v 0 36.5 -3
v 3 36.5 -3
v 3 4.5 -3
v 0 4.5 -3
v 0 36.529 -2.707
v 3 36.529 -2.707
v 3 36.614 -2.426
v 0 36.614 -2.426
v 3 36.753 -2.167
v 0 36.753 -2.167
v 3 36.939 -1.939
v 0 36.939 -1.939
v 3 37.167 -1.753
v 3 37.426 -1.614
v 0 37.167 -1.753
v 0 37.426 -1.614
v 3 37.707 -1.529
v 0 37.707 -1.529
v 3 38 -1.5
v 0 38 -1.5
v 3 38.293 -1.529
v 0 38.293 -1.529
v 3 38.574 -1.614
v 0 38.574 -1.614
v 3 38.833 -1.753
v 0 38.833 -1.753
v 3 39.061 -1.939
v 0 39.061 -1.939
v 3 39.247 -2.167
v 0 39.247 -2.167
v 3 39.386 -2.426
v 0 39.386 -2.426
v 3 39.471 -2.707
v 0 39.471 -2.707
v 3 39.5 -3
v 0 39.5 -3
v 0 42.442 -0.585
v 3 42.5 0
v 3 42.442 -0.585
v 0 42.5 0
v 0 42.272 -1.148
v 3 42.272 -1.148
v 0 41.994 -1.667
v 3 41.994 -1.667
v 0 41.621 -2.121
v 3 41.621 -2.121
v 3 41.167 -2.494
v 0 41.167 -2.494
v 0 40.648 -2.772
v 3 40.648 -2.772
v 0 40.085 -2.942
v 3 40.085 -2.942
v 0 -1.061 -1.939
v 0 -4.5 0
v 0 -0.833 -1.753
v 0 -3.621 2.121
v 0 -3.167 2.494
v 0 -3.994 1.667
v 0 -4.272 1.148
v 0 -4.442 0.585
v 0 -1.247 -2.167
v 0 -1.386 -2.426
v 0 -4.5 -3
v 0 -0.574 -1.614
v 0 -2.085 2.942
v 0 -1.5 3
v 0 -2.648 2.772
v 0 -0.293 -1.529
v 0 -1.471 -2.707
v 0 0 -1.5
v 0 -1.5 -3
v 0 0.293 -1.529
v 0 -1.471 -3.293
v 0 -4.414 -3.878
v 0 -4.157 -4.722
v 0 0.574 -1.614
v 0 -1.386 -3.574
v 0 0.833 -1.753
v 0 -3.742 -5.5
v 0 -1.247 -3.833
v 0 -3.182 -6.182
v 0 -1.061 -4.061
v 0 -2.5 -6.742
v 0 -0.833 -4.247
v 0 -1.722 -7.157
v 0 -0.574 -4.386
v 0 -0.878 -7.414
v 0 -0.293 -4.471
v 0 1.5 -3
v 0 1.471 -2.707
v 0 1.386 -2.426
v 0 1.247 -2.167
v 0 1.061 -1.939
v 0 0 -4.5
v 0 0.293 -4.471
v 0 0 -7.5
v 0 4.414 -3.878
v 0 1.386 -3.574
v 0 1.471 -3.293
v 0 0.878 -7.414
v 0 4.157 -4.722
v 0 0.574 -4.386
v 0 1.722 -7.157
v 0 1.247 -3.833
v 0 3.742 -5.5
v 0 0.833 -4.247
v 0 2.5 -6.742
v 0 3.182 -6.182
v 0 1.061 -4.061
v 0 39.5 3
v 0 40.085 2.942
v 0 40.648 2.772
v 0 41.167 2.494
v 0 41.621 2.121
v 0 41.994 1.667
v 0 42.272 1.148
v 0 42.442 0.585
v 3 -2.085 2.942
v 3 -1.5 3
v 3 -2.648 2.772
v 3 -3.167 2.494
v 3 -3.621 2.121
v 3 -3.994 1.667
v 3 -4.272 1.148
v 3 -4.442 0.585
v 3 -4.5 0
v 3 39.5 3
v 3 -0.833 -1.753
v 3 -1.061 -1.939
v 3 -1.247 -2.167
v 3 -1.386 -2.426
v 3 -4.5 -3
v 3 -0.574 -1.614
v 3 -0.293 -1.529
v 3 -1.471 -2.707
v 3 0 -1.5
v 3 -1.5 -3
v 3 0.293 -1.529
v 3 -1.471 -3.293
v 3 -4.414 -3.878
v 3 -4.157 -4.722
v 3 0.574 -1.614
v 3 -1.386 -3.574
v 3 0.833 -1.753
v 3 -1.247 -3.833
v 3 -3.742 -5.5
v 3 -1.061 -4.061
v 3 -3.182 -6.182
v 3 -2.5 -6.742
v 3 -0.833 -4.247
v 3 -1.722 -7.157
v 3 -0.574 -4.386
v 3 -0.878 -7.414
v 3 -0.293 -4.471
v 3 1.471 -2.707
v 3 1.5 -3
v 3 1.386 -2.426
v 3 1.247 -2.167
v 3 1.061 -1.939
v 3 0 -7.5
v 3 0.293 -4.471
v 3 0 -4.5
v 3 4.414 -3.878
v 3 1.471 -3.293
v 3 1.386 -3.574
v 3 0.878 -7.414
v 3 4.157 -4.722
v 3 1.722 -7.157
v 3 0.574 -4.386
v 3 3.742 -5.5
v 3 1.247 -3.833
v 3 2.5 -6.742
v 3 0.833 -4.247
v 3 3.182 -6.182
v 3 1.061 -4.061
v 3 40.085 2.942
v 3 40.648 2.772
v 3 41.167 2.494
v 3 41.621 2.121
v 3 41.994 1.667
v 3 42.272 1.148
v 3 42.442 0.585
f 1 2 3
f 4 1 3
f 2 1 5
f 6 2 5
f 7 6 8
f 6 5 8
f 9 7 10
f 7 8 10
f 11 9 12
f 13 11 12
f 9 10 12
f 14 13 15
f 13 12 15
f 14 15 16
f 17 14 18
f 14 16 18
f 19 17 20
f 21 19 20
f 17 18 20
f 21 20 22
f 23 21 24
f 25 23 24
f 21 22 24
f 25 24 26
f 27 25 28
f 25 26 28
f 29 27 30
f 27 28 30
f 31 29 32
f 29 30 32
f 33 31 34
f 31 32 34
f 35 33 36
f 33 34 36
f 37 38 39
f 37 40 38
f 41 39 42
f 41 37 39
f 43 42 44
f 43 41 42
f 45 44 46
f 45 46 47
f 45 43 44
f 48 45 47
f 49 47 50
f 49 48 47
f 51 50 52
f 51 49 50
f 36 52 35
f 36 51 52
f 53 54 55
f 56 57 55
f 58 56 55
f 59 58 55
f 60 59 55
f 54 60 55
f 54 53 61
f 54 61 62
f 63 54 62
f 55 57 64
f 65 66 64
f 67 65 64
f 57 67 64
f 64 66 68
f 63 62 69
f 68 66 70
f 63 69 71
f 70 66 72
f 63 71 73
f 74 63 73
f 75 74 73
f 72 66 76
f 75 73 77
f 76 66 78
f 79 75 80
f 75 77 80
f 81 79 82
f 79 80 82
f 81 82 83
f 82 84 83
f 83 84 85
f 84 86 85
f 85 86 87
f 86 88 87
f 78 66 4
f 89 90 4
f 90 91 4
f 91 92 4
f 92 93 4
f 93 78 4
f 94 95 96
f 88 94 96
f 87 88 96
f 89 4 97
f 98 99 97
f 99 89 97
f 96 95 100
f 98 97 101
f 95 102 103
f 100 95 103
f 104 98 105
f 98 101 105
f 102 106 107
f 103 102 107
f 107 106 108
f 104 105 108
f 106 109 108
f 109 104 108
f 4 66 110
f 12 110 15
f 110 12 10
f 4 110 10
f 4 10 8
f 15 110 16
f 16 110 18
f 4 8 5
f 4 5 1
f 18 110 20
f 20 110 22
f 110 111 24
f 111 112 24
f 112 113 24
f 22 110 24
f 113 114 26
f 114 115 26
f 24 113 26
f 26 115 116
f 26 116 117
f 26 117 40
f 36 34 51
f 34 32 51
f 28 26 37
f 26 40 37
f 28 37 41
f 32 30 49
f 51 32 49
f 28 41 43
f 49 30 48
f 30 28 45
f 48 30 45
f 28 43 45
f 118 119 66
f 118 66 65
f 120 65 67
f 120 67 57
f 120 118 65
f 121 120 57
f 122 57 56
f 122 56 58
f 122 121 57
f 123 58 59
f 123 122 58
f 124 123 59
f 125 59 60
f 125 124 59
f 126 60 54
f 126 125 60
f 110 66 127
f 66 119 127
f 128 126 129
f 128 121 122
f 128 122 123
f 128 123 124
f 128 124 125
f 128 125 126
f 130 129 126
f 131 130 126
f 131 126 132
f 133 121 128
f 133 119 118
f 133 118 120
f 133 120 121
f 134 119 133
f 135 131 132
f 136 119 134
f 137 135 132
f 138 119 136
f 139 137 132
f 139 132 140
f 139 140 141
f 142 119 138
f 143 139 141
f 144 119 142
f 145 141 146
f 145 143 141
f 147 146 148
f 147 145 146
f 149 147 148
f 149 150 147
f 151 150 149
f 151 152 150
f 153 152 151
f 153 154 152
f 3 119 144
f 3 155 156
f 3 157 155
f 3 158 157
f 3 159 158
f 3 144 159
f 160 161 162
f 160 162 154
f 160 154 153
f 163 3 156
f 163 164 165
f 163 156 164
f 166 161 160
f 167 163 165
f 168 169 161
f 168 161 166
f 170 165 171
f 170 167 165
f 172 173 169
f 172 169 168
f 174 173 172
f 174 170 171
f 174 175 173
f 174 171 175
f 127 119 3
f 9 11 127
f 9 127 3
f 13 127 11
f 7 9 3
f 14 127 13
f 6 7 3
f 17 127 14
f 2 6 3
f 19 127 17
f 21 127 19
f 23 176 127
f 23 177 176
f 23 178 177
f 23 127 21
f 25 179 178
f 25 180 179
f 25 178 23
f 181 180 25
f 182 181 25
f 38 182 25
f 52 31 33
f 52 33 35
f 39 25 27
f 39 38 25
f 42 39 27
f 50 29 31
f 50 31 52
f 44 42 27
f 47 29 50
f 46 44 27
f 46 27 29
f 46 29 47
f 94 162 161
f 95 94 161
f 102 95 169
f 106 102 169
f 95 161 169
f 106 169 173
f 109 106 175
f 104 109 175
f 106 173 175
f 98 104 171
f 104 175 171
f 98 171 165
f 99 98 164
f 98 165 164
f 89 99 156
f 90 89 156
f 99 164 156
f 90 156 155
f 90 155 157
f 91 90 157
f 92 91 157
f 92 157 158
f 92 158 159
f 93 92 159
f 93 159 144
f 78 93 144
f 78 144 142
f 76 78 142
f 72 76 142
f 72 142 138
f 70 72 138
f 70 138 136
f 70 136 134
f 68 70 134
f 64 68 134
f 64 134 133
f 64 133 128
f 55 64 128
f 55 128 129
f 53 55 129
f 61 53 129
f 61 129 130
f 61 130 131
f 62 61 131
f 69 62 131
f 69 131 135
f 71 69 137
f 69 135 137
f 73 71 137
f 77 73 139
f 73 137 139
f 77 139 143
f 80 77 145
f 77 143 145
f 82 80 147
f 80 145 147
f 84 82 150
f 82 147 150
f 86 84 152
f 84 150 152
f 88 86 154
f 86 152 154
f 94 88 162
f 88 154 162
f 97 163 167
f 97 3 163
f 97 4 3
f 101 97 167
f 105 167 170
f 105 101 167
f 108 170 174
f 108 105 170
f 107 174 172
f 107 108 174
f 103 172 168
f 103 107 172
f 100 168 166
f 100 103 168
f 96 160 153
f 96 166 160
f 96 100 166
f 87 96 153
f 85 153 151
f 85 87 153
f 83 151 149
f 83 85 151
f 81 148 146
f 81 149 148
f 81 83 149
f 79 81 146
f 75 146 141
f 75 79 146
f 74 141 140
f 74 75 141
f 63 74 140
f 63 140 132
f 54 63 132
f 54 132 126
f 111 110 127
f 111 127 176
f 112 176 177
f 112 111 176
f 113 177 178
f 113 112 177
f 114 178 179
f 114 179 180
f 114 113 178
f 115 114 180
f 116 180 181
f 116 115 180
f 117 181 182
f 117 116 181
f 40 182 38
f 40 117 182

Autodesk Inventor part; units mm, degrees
ref_plane "YZ Plane" through (0, 0, 0) normal (1, 0, 0) x (0, 1, 0)
ref_plane "XZ Plane" through (0, 0, 0) normal (0, 1, 0) x (-1, 0, 0)
ref_plane "XY Plane" through (0, 0, 0) normal (0, 0, 1) x (1, 0, 0)
sketch "Sketch1" plane through (0, 0, 0) normal (1, 0, 0) x (0, 1, 0)
  line L0 (-4.5, 3) -> (4.5, 3)
  line L1 (4.5, 3) -> (4.5, -3)
  line L2 (4.5, -3) -> (-4.5, -3)
  line L3 (-4.5, -3) -> (-4.5, 3)
  line L4 (-4.5, 3) -> (4.5, -3) construction
  line L5 (4.5, 3) -> (-4.5, -3) construction
  circle A0 centre (0, -3) radius 4.5
  point P0 (0, 0)
  dimension "d0" = 9
  dimension "d1" = 6
  dimension "d2" = 9
extrude "Extrusion1" add sketch "Sketch1" along normal blind 3
sketch "Sketch2" plane through (3, 0, 0) normal (1, 0, 0) x (0, 0, -1)
  line L0 (3, 4.5) -> (-3, 4.5)
  line L1 (-3, 4.5) -> (-3, 42.5)
  line L2 (-3, 42.5) -> (3, 42.5)
  line L3 (3, 42.5) -> (3, 4.5)
  point P0 (0, 0)
  dimension "d5" = 6
  dimension "d6" = 38
extrude "Extrusion2" add sketch "Sketch2" against normal blind 3
sketch "Sketch3" plane through (3, 0, 0) normal (1, 0, 0) x (0, 0, -1)
  arc A0 (3, -4.5) -> (3, 4.5) centre (3, 0) ccw projected
  circle A1 centre (3, 0) radius 1.5
  point P0 (0, 0)
  dimension "d9" = 3
extrude "Extrusion3" cut sketch "Sketch3" against normal blind 3
fillet "Fillet1" radius 3 3 edges at (1.5, -4.5, 3) (1.5, 42.5, 3) (1.5, 42.5, -3)
sketch "Sketch4" plane through (0, 0, 0) normal (-1, 0, 0) x (0, 0, 1)
  circle A0 centre (-3, 38) radius 1.5
  circle A1 centre (-3, 0) radius 1.5 projected
  point P0 (0, 0)
  dimension "d13" = 3
  dimension "d14" = 38
extrude "Extrusion4" cut sketch "Sketch4" against normal blind 3 contours A0
properties part number "Battery holder"
